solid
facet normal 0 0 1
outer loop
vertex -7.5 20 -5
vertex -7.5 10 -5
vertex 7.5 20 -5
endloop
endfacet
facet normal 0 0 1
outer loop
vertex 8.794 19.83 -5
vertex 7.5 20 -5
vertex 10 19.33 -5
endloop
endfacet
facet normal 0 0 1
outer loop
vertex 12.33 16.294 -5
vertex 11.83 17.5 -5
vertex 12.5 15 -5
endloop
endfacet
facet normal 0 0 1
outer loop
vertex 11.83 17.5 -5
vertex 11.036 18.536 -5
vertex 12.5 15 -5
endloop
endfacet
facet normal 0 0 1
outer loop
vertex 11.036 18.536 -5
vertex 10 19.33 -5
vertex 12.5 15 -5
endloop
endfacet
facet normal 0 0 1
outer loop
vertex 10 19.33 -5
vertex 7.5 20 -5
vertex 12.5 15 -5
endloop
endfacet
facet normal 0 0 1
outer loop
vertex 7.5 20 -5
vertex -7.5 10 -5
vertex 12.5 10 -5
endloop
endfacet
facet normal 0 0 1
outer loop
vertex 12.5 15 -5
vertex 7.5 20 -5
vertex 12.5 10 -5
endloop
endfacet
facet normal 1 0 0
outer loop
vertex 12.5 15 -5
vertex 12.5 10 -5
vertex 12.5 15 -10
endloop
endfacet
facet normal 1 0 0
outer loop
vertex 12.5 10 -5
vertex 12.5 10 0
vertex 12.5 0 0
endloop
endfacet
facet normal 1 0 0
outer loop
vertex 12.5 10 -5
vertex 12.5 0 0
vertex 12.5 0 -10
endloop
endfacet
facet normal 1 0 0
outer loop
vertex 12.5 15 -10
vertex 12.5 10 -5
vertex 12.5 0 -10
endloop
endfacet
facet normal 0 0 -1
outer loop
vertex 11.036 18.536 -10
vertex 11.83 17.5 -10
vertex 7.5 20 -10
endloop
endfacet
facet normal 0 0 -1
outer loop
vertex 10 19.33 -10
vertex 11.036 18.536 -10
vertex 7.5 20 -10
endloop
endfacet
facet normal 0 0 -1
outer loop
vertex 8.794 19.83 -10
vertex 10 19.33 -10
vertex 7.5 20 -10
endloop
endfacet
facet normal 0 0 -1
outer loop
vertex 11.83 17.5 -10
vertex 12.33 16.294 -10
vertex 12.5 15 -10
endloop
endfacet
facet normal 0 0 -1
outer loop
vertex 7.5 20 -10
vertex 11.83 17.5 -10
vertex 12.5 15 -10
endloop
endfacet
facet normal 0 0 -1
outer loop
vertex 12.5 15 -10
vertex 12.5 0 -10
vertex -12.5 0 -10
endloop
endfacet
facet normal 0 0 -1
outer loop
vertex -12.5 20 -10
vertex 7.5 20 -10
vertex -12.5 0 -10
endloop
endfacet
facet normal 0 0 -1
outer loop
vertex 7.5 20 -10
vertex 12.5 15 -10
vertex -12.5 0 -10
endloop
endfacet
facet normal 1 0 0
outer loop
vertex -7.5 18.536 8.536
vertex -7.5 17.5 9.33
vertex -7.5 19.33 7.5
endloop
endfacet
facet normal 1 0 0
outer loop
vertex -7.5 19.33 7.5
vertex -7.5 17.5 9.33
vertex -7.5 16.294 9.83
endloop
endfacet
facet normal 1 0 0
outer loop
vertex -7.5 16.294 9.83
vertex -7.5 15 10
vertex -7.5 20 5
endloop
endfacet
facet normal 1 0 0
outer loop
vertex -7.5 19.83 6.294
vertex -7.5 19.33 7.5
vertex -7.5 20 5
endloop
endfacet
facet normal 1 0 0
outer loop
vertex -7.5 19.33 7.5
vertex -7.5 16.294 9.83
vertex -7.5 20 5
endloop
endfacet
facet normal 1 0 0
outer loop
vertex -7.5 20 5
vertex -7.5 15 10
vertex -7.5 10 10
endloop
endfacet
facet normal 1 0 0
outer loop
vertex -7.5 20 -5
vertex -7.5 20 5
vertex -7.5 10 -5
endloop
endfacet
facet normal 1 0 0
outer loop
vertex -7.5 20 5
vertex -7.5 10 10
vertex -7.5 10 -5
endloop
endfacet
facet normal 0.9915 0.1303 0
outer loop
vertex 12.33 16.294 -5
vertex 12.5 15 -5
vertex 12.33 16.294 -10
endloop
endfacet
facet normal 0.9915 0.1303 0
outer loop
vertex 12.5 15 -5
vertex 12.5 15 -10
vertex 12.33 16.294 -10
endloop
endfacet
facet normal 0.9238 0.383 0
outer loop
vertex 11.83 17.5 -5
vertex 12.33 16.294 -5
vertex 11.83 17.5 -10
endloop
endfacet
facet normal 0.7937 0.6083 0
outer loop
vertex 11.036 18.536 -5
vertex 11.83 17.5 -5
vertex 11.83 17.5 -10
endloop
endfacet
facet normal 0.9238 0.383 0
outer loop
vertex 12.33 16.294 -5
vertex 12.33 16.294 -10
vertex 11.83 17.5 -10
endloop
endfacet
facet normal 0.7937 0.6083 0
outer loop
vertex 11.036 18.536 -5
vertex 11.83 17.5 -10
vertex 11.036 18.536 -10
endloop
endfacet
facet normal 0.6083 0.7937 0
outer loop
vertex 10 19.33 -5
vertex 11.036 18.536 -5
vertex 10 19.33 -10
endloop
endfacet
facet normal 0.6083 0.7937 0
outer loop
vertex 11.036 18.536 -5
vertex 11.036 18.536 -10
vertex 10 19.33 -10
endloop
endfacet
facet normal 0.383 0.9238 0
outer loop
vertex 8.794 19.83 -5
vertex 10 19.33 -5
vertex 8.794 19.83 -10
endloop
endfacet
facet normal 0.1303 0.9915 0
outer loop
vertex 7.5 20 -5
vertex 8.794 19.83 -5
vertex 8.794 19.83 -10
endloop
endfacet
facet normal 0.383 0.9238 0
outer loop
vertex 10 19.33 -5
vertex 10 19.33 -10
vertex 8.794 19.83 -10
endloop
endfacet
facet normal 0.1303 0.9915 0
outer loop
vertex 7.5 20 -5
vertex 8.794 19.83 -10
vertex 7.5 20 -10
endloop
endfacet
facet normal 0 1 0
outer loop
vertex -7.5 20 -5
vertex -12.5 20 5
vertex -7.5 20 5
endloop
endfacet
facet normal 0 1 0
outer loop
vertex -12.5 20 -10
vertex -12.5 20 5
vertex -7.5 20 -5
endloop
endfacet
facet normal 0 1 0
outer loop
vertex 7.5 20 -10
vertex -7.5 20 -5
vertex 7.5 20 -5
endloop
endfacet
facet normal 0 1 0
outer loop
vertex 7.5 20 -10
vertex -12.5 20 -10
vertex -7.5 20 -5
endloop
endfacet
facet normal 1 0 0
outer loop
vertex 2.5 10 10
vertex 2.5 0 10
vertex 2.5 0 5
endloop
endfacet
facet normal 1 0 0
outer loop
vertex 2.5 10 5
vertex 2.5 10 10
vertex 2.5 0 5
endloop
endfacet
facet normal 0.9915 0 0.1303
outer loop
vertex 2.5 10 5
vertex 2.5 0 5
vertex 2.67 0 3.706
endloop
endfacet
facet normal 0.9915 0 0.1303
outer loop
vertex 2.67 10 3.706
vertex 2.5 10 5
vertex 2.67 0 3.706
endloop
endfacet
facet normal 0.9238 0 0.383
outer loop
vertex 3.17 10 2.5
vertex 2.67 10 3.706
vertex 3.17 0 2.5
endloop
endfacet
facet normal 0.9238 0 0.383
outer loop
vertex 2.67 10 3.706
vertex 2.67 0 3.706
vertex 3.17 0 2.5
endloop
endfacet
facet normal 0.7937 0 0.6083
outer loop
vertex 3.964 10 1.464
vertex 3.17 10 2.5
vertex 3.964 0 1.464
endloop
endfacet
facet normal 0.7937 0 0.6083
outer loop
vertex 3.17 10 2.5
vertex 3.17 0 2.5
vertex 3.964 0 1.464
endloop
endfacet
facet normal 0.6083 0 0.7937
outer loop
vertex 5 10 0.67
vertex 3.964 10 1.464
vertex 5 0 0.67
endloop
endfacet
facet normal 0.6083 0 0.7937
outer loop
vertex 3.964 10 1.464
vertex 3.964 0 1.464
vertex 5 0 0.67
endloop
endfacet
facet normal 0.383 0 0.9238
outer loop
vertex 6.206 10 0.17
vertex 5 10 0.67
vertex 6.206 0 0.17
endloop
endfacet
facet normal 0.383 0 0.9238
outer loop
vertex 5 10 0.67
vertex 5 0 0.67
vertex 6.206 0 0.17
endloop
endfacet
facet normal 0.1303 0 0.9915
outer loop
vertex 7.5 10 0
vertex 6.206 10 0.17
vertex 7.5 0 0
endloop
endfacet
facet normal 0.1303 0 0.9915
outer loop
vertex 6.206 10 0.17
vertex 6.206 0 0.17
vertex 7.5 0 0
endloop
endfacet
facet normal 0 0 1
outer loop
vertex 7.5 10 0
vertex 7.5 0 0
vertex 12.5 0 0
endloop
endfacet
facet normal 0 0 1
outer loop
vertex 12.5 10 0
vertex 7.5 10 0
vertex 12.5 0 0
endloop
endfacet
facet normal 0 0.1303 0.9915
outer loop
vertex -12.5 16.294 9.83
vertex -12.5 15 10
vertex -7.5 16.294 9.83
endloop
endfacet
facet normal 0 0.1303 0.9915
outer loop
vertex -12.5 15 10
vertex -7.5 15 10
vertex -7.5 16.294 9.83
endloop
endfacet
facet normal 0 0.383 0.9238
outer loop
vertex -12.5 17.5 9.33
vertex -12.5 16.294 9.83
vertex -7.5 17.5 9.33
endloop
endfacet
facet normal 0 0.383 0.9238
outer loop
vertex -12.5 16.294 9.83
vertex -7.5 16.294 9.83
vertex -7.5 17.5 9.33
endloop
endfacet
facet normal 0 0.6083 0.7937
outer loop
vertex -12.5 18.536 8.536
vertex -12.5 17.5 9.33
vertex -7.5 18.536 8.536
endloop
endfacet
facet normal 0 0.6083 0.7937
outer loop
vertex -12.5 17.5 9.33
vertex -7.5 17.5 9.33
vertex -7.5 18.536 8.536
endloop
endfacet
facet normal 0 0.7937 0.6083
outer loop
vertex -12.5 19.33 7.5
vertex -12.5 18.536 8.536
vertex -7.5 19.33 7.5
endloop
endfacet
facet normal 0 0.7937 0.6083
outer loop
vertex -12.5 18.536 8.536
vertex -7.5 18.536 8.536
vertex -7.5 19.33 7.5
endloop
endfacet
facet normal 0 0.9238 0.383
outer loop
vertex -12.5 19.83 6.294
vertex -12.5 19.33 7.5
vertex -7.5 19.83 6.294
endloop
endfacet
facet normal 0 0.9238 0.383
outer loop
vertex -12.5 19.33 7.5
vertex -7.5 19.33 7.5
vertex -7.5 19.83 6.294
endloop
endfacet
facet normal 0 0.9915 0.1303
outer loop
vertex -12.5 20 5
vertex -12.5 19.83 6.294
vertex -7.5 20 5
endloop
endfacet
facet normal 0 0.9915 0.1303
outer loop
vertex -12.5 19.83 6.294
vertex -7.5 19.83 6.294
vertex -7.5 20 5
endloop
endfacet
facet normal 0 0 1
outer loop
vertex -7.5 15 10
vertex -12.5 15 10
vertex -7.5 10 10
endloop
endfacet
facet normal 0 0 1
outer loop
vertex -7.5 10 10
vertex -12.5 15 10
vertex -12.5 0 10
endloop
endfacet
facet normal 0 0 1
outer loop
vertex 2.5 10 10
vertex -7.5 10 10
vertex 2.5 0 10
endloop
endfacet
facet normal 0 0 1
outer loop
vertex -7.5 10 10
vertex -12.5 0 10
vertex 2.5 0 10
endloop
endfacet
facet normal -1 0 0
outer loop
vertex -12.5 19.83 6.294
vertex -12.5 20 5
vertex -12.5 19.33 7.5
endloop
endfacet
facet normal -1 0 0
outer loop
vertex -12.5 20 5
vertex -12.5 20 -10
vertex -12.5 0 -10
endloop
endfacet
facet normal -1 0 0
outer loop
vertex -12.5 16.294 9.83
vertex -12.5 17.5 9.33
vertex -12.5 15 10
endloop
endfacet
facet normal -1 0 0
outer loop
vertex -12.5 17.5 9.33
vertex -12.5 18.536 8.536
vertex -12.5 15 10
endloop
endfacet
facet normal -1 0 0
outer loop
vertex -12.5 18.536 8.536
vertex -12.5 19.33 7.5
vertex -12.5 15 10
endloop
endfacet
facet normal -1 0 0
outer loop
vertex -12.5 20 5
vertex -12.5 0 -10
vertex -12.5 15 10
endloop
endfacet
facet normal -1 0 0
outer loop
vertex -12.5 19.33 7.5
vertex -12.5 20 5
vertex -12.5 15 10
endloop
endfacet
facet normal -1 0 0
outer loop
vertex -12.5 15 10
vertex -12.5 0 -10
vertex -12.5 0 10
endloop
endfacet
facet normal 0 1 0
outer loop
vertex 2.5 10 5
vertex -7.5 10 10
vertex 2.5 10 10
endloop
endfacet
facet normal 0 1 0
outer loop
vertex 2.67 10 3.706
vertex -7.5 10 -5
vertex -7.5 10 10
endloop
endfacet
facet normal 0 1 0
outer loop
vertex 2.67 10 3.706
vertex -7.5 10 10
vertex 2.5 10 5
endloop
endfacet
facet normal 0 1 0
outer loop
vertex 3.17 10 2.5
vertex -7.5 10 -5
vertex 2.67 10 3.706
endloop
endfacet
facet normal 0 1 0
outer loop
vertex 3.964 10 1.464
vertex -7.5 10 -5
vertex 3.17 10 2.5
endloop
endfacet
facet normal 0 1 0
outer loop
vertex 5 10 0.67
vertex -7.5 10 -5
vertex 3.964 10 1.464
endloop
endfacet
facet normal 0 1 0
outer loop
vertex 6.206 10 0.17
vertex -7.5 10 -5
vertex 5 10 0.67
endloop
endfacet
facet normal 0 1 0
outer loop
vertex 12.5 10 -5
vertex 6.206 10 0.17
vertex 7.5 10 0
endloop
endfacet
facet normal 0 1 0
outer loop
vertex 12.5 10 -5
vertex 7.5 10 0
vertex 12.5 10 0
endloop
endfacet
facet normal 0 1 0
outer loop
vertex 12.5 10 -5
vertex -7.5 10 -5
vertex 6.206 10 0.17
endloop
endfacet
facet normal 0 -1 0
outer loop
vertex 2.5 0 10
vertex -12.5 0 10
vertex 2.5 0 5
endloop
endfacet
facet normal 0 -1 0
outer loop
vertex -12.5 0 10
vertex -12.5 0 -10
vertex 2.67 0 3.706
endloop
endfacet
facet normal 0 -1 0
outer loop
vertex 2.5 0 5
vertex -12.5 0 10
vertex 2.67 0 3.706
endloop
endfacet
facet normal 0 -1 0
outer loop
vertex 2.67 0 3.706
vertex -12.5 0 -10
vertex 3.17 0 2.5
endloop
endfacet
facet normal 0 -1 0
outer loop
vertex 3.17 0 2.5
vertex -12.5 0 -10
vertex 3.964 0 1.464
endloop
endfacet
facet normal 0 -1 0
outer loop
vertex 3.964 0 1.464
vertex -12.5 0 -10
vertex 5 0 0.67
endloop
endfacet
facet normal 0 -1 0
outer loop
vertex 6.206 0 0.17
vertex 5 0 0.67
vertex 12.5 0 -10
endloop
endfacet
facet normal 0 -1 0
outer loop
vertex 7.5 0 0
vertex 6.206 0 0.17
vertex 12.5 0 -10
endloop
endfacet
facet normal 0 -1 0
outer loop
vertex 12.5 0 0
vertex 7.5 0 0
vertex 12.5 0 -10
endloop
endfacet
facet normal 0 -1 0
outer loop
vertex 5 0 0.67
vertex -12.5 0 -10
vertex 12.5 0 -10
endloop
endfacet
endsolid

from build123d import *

# Parameters (mm, degrees)
EXTRUDE_1_DEPTH = 10
EXTRUDE_2_DEPTH = 20
FILLET_1_R      = 5


with BuildPart() as part:
    # 草圖1 → 填料-伸長1 (new body)
    with BuildSketch(Plane(origin=(0, 0, 0), x_dir=(1, 0, 0), z_dir=(0, 1, 0))):
        with BuildLine():
            Line((-12.5, -10), (2.5, -10))
            Line((2.5, -10), (2.5, -5))
            ThreePointArc((2.5, -5), (3.964466094, -1.464466094), (7.5, 0))
            Line((7.5, 0), (12.5, 0))
            Line((12.5, 0), (12.5, 10))
            Line((12.5, 10), (-12.5, 10))
            Line((-12.5, 10), (-12.5, -10))
        make_face()
    extrude(amount=EXTRUDE_1_DEPTH)

    # 草圖1<3> → 填料-伸長2 (add)
    with BuildSketch(Plane(origin=(0, 0, 0), x_dir=(1, 0, 0), z_dir=(0, 1, 0))):
        Polygon((-12.5, 5), (-12.5, -10), (-7.5, -10), (-7.5, 5), (12.5, 5), (12.5, 10), (-7.5, 10), (-12.5, 10), align=None)
    extrude(amount=EXTRUDE_2_DEPTH)

    # 圓角1
    fillet_1_edges = [part.edges().sort_by_distance(p)[0] for p in [
        (-10, 20, 10),
        (12.5, 20, -7.5),
    ]]
    fillet(fillet_1_edges, radius=FILLET_1_R)


solid = part.part
